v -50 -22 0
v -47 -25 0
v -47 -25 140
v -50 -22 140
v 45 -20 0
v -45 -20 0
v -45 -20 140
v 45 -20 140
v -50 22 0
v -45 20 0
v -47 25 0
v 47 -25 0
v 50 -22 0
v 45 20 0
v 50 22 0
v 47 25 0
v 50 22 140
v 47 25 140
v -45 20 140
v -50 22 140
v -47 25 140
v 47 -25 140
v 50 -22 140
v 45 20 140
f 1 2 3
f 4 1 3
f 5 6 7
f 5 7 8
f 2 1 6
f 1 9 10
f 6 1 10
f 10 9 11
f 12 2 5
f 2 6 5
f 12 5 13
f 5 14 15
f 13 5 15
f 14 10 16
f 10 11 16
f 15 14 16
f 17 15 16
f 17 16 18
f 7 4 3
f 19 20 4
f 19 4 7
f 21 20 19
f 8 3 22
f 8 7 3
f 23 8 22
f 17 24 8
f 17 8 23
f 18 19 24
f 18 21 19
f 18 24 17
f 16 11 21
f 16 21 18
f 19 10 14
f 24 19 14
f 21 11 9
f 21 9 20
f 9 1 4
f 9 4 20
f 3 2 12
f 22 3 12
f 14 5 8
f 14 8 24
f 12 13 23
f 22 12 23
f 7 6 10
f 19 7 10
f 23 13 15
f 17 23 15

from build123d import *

# Parameters (mm, degrees)
F0_W     = 100
F0_H     = 50
F0_W_2   = 90
F0_H_2   = 40
F1_DEPTH = 140
F2_SIZE  = 3


with BuildPart() as f1:
    # F0 (on Top) → F1 (new body)
    with BuildSketch(Plane.XY):
        Rectangle(F0_W, F0_H)
        Rectangle(F0_W_2, F0_H_2, mode=Mode.SUBTRACT)
    extrude(amount=F1_DEPTH)

    # F2
    f2_edges = [f1.edges().sort_by_distance(p)[0] for p in [
        (50, -25, 70),
        (50, 25, 70),
        (-50, -25, 70),
        (-50, 25, 70),
    ]]
    chamfer(f2_edges, length=F2_SIZE)


solid = f1.part
